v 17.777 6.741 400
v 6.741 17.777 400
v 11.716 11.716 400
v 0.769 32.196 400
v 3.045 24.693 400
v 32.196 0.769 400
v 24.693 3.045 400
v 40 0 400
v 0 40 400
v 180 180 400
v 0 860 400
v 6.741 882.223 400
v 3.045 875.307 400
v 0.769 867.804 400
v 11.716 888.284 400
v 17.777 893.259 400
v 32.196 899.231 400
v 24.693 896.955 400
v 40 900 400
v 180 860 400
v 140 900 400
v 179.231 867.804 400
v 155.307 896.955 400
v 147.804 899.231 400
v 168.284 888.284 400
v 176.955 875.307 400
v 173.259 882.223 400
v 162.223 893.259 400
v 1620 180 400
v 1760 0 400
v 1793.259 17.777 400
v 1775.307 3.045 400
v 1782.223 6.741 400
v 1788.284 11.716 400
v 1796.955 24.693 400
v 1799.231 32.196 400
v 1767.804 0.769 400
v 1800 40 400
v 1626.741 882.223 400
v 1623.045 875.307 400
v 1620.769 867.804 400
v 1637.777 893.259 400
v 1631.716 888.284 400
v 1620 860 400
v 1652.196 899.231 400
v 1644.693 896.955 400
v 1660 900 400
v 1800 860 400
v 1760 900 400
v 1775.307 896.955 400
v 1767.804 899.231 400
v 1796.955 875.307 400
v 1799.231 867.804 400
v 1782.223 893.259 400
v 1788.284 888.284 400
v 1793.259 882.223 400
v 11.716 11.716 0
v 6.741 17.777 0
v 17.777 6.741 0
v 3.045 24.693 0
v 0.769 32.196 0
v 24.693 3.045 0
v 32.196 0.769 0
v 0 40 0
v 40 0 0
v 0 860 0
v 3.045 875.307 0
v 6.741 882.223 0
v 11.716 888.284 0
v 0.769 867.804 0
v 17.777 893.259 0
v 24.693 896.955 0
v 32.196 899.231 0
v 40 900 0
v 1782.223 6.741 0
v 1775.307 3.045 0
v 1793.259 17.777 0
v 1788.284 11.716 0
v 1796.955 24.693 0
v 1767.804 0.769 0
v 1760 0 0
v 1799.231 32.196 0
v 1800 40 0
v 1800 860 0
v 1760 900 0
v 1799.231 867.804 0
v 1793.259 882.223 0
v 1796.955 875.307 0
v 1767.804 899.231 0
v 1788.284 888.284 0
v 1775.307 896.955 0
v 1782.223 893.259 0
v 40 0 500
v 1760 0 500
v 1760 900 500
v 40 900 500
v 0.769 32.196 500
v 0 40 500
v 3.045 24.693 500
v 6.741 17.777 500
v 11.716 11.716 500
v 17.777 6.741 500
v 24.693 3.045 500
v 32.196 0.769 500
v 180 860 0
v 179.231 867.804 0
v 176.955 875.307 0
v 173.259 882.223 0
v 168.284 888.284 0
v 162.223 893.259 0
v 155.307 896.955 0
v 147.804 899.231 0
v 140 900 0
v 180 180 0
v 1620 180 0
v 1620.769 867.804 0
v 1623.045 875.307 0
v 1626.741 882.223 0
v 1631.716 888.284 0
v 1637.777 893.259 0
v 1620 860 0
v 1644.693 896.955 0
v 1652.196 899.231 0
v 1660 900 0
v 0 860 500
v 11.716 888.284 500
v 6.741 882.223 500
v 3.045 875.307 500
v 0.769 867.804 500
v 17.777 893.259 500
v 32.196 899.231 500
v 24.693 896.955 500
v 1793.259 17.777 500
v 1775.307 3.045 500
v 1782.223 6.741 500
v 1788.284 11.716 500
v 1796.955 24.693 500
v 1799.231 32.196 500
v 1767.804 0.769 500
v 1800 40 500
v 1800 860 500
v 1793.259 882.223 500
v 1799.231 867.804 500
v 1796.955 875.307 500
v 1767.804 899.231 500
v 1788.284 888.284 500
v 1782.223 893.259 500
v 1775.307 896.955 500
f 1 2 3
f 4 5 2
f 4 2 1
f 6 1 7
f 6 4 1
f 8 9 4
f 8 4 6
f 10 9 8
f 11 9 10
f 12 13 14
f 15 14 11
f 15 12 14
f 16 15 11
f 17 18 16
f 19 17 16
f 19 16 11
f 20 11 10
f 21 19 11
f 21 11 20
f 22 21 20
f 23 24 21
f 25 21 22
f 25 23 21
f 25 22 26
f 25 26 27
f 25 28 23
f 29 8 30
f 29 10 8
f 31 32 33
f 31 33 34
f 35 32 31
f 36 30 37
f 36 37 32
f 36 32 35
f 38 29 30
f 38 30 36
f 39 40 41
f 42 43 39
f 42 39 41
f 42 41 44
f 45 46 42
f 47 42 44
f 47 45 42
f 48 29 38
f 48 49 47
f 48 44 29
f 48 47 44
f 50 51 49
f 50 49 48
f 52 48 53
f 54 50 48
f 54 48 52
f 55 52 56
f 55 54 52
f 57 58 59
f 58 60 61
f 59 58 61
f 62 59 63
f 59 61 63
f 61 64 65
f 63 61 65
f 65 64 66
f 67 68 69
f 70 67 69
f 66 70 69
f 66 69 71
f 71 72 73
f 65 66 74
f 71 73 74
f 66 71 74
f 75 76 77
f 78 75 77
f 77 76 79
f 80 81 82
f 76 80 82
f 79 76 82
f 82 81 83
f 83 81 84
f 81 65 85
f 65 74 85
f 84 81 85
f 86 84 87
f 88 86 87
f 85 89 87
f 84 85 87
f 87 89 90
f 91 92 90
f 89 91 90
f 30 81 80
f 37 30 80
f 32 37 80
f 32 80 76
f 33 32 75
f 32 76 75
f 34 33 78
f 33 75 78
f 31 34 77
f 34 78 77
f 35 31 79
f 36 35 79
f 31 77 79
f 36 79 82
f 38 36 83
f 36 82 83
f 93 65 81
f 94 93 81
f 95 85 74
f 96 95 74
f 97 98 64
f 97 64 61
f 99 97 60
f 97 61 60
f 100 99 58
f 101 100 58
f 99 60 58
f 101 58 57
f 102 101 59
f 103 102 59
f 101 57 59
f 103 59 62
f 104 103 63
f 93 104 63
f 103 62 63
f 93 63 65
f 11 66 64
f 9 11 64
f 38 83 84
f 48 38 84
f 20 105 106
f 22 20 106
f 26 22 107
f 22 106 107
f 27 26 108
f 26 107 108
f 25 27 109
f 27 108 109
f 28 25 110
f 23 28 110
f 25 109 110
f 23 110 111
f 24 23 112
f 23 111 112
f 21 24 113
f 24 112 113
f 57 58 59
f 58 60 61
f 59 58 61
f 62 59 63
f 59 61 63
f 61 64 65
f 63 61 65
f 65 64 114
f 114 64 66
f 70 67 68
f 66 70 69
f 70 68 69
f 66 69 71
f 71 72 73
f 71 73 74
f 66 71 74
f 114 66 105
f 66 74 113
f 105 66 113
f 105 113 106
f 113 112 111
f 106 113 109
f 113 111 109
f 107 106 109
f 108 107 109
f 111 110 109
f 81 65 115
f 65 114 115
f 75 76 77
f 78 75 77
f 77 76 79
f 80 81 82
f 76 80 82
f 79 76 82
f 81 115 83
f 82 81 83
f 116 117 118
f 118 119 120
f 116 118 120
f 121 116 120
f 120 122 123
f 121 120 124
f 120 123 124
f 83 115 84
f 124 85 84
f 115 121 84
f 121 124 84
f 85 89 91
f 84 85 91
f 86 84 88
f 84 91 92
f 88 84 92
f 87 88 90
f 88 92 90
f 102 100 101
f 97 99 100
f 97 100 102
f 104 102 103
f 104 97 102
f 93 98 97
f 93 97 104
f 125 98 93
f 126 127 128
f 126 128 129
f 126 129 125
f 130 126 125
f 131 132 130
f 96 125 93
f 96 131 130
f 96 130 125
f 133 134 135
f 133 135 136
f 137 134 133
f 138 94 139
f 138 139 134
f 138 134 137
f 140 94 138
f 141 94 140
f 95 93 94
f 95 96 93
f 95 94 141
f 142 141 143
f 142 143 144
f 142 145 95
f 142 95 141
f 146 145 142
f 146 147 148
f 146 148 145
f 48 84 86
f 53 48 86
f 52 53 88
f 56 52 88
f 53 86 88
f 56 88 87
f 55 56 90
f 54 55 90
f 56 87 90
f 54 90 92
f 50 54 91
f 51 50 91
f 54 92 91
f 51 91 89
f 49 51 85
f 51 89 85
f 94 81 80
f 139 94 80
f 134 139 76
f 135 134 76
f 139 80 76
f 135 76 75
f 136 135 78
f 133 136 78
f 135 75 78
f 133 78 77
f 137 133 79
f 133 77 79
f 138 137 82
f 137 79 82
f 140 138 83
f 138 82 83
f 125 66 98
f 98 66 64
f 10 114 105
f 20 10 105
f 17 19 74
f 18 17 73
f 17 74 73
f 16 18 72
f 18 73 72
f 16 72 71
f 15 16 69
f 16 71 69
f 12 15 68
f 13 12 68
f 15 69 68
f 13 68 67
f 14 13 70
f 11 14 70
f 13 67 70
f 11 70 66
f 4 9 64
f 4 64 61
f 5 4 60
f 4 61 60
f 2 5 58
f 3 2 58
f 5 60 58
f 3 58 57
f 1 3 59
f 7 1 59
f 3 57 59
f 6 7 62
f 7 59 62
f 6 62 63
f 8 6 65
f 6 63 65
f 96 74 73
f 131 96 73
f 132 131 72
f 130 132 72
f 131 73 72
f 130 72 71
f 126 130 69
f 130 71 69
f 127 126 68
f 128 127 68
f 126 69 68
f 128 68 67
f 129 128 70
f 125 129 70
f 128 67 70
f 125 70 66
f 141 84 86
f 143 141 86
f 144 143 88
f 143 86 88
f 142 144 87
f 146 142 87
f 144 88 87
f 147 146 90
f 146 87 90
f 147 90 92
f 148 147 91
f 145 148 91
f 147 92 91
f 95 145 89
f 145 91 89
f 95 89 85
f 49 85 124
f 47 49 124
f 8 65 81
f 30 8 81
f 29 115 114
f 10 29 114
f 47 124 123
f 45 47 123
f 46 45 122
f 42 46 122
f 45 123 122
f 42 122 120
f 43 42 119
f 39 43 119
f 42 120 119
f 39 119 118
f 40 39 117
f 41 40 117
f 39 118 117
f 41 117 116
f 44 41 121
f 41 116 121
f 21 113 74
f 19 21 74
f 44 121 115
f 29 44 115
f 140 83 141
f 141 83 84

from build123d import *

# Parameters (mm, degrees)
F1_DEPTH = 500
F3_DEPTH = 400


# Not quite as in the source:
# - a feature names something its author has since deleted; it is built from what else it names


with BuildPart() as f1:
    # F0 (on Top) → F1 (new body)
    with BuildSketch(Plane.XY):
        with BuildLine():
            ThreePointArc((0, 40), (11.7157287525, 11.7157287525), (40, 0))
            Line((40, 0), (1760, 0))
            ThreePointArc((1760, 0), (1788.2842712475, 11.7157287525), (1800, 40))
            Line((1800, 40), (1800, 860))
            ThreePointArc((1800, 860), (1788.2842712475, 888.2842712475), (1760, 900))
            Line((1760, 900), (40, 900))
            ThreePointArc((40, 900), (11.7157287525, 888.2842712475), (0, 860))
            Line((0, 860), (0, 40))
        make_face()
    extrude(amount=F1_DEPTH)


with BuildPart() as f3:
    # F2 (on Top) → F3 (new body)
    with BuildSketch(Plane.XY):
        with BuildLine():
            ThreePointArc((40, 900), (11.7157287525, 888.2842712475), (0, 860))
            Line((0, 860), (0, 40))
            ThreePointArc((0, 40), (11.7157287525, 11.7157287525), (40, 0))
            Line((40, 0), (1760, 0))
            ThreePointArc((1760, 0), (1788.2842712475, 11.7157287525), (1800, 40))
            Line((1800, 40), (1800, 860))
            ThreePointArc((1800, 860), (1788.2842712475, 888.2842712475), (1760, 900))
            Line((1760, 900), (1660, 900))
            ThreePointArc((1660, 900), (1631.7157287525, 888.2842712475), (1620, 860))
            Line((1620, 860), (1620, 180))
            Line((1620, 180), (180, 180))
            Line((180, 180), (180, 860))
            ThreePointArc((180, 860), (168.2842712475, 888.2842712475), (140, 900))
            Line((140, 900), (40, 900))
        make_face()
    extrude(amount=F3_DEPTH)


solid = Compound([f1.part, f3.part])
